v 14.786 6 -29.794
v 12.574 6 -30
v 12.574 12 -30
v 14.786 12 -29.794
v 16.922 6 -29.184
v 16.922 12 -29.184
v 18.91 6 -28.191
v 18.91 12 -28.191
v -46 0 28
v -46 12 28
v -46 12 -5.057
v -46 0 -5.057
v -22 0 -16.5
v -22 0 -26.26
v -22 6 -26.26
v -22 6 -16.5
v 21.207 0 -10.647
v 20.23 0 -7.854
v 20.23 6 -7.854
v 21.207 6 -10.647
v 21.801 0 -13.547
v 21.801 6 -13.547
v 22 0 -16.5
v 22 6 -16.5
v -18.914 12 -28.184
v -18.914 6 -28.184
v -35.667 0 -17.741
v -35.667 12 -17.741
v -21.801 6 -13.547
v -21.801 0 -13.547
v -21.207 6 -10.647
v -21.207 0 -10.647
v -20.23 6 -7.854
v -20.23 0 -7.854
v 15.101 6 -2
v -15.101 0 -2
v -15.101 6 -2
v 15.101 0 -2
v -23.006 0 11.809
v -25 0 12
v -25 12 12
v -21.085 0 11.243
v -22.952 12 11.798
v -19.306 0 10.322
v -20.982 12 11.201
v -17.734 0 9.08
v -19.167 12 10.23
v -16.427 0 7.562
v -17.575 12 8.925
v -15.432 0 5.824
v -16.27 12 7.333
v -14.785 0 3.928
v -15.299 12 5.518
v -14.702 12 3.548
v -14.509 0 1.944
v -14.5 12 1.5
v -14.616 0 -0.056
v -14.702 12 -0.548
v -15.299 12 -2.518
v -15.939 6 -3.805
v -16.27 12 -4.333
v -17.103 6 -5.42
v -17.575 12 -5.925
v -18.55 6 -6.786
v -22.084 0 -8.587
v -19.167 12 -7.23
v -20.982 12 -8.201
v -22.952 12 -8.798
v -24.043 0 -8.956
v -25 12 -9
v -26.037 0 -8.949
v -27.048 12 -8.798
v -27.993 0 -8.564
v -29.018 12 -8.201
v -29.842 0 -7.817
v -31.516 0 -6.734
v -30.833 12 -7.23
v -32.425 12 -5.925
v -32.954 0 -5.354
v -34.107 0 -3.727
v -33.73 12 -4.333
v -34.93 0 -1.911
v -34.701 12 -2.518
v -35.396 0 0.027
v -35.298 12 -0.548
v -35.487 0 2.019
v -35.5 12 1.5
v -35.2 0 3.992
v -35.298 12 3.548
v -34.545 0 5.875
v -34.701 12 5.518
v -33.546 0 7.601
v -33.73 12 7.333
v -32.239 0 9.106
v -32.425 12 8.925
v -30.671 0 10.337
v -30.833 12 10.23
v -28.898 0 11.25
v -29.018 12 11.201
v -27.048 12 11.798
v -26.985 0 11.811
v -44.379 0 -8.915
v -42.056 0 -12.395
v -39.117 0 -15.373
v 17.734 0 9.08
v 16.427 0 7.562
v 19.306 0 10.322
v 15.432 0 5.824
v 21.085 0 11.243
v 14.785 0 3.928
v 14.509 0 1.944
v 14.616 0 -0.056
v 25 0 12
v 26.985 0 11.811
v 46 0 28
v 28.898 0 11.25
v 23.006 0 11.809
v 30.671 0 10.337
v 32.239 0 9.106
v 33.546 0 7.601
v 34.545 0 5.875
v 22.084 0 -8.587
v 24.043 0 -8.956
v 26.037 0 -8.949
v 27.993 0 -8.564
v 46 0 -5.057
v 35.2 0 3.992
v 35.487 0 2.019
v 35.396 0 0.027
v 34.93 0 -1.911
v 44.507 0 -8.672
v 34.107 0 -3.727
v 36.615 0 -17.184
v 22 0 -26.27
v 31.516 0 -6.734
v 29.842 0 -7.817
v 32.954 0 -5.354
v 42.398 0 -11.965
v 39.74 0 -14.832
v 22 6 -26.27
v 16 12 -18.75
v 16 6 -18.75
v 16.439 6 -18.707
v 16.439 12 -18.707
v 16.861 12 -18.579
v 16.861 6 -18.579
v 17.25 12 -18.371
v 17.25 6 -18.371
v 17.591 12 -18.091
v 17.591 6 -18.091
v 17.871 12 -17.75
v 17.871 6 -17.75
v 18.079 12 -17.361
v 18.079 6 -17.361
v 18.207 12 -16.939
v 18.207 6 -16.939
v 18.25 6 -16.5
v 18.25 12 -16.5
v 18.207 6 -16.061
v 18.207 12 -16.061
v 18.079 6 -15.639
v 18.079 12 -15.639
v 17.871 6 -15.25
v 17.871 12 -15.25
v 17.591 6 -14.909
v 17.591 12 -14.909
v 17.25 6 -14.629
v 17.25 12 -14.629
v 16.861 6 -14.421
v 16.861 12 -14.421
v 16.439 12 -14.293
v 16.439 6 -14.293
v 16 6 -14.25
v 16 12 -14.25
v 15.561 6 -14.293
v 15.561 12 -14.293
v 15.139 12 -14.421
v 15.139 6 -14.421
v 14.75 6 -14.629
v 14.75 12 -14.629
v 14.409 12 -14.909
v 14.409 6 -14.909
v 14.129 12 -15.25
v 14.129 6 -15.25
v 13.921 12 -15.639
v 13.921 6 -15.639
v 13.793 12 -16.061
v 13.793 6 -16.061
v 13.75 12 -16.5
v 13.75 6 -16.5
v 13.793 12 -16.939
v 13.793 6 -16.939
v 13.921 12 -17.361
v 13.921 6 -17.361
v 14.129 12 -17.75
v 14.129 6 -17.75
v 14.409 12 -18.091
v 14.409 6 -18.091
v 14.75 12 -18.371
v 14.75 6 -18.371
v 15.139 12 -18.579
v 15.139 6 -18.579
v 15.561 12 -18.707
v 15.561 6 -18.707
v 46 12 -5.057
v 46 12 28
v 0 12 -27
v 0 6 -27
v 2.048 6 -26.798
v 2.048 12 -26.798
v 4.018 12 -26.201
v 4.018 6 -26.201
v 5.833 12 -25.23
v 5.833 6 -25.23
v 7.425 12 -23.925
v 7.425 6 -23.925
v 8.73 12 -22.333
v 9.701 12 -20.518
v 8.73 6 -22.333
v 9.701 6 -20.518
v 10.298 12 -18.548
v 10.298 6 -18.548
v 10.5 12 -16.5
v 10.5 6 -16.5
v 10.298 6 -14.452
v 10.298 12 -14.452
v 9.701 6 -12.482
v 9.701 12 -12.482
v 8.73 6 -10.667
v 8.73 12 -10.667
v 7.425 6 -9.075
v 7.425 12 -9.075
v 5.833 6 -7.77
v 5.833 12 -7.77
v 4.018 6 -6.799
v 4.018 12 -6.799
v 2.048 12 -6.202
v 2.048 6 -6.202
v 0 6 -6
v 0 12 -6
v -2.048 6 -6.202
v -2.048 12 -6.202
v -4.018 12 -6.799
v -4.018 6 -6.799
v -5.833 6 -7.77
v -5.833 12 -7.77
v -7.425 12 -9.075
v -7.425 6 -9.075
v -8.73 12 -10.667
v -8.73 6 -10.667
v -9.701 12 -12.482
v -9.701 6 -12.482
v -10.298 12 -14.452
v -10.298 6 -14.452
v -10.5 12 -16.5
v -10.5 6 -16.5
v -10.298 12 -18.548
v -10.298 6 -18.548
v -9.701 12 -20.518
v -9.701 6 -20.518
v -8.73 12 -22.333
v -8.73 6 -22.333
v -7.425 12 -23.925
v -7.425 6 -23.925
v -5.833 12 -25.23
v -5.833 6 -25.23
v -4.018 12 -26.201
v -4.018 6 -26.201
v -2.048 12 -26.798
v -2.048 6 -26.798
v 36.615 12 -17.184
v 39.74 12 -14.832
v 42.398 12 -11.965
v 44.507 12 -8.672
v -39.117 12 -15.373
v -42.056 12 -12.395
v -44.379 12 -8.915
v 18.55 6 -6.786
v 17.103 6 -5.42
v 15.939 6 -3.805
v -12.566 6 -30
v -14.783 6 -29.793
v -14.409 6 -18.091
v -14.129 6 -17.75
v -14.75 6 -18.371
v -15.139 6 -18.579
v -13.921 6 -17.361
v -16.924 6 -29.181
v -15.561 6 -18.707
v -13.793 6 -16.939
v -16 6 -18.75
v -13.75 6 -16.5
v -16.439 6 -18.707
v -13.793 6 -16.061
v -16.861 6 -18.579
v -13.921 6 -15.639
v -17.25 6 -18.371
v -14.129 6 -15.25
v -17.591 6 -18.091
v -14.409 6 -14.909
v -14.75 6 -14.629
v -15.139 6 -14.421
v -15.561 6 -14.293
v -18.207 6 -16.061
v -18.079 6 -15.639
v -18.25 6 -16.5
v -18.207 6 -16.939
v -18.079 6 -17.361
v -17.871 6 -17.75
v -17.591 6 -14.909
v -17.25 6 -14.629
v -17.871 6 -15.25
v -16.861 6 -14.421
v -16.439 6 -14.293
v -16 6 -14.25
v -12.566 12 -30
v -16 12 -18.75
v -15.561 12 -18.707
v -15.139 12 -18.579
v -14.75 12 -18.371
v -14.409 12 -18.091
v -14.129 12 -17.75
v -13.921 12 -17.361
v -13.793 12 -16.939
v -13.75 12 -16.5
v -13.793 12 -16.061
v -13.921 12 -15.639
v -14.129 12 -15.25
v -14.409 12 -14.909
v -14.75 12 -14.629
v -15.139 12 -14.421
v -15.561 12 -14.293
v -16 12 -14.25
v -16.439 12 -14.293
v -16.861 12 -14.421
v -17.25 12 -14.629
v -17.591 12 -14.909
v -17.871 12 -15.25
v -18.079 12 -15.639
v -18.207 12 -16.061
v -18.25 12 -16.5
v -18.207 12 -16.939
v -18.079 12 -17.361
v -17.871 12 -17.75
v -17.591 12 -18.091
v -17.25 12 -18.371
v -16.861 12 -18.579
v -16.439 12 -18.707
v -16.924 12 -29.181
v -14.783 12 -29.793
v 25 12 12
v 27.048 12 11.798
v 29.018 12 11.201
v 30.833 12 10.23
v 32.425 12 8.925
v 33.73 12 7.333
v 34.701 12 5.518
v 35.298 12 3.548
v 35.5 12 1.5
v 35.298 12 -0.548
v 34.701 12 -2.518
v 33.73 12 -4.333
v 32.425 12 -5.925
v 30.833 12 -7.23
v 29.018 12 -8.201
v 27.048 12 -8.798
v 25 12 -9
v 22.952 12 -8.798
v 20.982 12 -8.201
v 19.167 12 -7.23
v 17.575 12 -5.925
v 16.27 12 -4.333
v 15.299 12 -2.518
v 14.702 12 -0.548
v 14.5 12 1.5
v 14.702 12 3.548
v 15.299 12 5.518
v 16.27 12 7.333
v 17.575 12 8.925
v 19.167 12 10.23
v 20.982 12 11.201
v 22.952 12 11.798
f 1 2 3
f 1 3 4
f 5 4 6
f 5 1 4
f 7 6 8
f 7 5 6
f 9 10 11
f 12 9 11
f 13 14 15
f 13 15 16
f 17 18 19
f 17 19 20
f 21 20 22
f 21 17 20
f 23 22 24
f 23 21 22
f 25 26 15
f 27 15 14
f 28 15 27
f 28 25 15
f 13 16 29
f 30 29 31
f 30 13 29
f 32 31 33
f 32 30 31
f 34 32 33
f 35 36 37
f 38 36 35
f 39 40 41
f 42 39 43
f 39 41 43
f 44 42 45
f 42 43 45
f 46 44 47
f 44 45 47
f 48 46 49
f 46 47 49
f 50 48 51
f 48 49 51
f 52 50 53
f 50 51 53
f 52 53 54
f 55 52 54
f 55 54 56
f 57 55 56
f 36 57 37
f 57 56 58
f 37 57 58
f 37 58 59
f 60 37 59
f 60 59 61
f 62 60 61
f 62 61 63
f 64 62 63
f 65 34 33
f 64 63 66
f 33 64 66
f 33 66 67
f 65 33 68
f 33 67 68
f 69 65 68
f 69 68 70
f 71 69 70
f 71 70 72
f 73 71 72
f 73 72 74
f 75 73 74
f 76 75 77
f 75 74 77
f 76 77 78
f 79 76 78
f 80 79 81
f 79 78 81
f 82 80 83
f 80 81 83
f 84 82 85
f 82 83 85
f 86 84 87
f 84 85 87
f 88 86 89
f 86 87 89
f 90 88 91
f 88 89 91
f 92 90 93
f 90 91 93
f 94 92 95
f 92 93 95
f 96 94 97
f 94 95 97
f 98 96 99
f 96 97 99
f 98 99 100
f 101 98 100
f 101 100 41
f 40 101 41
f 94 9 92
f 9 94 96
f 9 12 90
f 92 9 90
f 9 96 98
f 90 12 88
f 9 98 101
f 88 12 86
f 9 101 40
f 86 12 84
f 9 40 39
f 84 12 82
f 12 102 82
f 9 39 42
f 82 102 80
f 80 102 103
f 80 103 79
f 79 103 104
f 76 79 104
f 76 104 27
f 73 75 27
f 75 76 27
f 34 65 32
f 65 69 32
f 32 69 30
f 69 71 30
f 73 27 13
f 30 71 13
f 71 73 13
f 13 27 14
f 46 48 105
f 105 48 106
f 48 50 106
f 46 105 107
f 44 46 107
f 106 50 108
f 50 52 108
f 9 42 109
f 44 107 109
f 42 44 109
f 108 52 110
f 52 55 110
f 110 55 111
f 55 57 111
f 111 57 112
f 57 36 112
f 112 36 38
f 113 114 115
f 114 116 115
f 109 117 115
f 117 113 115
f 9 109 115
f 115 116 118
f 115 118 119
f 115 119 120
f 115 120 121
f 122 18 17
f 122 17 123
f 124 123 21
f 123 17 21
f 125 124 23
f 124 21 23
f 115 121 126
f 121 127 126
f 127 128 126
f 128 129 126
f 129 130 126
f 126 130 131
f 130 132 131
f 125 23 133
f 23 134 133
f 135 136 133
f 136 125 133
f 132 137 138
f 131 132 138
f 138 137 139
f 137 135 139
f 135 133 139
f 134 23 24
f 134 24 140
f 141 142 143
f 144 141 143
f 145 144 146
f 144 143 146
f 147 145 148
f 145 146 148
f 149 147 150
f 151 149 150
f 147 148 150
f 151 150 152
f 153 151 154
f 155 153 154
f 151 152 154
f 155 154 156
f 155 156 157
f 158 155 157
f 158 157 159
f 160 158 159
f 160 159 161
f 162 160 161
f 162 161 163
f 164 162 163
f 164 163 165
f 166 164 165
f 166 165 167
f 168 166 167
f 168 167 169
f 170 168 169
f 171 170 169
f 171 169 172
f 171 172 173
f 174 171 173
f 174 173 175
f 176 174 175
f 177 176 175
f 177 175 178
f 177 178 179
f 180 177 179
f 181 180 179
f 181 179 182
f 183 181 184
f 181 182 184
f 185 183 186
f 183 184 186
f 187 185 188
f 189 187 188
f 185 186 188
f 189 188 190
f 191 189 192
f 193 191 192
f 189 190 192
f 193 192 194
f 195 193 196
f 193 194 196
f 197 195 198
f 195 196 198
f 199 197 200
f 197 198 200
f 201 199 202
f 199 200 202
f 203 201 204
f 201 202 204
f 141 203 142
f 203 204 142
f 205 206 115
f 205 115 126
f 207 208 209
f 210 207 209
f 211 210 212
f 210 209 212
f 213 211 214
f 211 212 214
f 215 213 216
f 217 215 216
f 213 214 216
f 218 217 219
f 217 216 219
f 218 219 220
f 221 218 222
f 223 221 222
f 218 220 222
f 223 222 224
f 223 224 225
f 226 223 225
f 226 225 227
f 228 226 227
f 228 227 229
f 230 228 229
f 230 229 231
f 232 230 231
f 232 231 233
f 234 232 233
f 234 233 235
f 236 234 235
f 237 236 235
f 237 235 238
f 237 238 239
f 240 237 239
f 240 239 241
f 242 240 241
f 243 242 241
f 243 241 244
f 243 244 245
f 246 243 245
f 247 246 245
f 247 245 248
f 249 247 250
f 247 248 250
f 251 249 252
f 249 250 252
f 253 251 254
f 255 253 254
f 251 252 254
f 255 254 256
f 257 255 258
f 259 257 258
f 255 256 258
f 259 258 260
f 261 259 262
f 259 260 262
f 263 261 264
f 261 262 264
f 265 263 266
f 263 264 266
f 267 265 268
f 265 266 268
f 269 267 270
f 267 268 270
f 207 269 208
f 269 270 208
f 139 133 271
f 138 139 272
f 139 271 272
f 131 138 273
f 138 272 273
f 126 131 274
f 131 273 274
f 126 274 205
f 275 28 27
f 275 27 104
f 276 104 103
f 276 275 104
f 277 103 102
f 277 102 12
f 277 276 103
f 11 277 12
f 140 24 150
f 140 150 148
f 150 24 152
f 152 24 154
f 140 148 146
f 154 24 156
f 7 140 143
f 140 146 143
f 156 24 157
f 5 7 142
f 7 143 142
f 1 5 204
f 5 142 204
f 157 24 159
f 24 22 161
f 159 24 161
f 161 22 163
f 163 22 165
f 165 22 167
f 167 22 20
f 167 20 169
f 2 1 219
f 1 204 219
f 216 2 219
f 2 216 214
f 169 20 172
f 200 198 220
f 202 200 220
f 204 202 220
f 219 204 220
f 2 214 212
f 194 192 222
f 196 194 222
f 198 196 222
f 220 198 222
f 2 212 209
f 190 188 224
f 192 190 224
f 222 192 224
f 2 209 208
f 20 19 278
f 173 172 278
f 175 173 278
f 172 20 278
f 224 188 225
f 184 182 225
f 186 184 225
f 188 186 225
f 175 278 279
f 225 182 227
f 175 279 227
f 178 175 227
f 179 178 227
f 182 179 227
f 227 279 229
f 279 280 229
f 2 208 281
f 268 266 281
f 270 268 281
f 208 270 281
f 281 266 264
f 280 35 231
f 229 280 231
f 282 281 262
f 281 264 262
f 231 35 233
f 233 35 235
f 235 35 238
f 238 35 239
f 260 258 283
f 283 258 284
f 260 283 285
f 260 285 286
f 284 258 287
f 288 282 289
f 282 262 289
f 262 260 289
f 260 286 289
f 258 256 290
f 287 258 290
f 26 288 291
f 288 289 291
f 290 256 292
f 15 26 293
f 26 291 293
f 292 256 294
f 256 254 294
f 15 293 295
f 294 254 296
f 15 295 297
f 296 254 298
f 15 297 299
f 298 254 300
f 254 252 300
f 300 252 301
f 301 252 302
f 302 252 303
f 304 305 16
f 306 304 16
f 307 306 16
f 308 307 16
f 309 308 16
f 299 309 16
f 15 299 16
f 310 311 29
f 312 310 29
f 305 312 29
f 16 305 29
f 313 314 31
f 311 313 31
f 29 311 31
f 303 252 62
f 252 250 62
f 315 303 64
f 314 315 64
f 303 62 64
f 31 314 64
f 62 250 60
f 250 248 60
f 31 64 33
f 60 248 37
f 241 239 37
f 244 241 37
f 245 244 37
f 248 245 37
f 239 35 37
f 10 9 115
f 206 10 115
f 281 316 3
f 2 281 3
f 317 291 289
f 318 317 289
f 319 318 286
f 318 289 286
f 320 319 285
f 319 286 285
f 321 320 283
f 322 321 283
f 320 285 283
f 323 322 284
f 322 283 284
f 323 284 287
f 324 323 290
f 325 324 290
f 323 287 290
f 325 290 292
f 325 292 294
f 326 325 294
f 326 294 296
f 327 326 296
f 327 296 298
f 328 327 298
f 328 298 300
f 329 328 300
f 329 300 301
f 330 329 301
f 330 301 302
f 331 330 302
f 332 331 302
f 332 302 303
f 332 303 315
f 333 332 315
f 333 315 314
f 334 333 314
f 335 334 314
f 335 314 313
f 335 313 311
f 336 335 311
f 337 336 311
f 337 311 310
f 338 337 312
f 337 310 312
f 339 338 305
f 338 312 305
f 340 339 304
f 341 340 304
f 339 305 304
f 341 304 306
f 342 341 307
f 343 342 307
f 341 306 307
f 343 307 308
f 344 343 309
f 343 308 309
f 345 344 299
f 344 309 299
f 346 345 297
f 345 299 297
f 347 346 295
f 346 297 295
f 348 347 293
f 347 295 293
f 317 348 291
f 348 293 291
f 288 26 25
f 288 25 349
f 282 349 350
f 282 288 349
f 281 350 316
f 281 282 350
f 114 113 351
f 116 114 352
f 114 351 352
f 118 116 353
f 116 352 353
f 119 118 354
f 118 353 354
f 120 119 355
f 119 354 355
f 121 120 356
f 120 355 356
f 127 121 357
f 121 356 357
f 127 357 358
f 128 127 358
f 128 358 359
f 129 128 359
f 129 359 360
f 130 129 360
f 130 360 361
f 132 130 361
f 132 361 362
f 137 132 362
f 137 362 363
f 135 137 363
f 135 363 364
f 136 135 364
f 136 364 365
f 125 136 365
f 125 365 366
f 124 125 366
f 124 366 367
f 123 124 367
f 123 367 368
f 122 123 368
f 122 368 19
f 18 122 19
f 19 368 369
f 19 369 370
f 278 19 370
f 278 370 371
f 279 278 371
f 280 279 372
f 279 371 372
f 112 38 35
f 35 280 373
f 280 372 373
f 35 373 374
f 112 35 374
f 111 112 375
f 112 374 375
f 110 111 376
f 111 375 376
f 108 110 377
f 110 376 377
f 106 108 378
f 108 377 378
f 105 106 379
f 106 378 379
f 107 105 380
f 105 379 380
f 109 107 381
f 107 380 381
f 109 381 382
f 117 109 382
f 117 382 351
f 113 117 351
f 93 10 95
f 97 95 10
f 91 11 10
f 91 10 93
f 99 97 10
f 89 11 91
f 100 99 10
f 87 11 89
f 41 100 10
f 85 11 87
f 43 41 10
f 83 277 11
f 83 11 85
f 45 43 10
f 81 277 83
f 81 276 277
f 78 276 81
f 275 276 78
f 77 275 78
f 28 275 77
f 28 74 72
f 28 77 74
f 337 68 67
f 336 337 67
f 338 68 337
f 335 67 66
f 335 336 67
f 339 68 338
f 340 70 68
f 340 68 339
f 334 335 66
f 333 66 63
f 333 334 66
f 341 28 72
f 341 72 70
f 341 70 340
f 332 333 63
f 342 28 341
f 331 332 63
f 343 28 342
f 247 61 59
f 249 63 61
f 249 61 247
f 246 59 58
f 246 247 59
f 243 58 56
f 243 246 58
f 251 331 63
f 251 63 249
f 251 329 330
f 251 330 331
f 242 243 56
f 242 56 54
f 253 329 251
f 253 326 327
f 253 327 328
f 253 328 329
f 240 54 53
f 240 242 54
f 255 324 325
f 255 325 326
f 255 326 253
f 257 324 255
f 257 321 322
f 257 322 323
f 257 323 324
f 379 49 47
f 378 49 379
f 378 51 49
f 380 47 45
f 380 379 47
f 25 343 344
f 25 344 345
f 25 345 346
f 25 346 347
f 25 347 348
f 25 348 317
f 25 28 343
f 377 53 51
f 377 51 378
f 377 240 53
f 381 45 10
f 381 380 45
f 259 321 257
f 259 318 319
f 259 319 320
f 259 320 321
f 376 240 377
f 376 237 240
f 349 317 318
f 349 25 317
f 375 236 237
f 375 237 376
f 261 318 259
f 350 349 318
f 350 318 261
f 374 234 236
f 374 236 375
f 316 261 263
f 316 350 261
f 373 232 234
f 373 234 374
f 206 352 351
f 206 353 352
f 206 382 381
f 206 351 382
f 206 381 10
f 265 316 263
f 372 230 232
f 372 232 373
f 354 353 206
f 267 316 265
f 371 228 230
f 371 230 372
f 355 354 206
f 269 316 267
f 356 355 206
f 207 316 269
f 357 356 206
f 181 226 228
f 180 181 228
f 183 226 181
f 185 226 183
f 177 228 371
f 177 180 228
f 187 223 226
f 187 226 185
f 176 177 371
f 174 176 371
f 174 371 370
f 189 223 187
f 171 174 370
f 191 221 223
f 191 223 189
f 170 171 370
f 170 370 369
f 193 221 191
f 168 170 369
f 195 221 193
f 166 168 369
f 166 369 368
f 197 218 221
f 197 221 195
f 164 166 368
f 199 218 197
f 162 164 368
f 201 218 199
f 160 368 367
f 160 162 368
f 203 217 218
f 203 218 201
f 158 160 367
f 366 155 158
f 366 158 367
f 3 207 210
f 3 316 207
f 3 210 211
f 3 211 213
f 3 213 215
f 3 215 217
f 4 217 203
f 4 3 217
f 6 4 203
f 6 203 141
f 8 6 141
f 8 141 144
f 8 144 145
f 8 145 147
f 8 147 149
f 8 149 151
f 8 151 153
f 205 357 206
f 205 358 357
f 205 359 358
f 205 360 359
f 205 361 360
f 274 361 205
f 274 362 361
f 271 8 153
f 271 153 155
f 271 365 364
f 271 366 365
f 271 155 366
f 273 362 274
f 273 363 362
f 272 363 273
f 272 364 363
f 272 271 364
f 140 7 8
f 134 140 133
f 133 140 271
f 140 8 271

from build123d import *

# Parameters (mm, degrees)
SKETCH1_W           = 92
SKETCH1_H           = 56
BOSS_EXTRUDE1_DEPTH = 12
SKETCH8_W           = 92
SKETCH8_H           = 2
BOSS_EXTRUDE3_DEPTH = 12
CUT_EXTRUDE1_REACH  = 58.214
SKETCH2_R           = 10.5
CUT_EXTRUDE5_REACH  = 58.214
FILLET2_R           = 12
CUT_EXTRUDE6_DEPTH  = 6
CUT_EXTRUDE7_REACH  = 58.214
SKETCH12_R          = 2.25
SKETCH12_R_2        = 10.5


with BuildPart() as part:
    # Sketch1 → Boss-Extrude1 (new body)
    with BuildSketch(Plane(origin=(0, 0, 0), x_dir=(1, 0, 0), z_dir=(0, 1, 0))):
        Rectangle(SKETCH1_W, SKETCH1_H)
    extrude(amount=BOSS_EXTRUDE1_DEPTH)

    # Sketch8 → Boss-Extrude3 (add)
    with BuildSketch(Plane(origin=(0, 12, 0), x_dir=(1, 0, 0), z_dir=(0, 1, 0))):
        with Locations((0, 29)):
            Rectangle(SKETCH8_W, SKETCH8_H)
    extrude(amount=-BOSS_EXTRUDE3_DEPTH)

    # Sketch2 → Cut-Extrude1 (cut, up to next)
    with BuildSketch(Plane(origin=(0, 12, 0), x_dir=(1, 0, 0), z_dir=(0, 1, 0)), mode=Mode.PRIVATE) as cut_extrude1_sk1:
        with Locations(Location((-25, -1.5, 0), (0, 0, 270))):
            Circle(SKETCH2_R)
    cut_extrude1_tool1 = extrude(cut_extrude1_sk1.sketch, amount=-CUT_EXTRUDE1_REACH, mode=Mode.PRIVATE) & part.part
    # Sketch2 → Cut-Extrude1 (cut, up to next)
    with BuildSketch(Plane(origin=(0, 12, 0), x_dir=(1, 0, 0), z_dir=(0, 1, 0)), mode=Mode.PRIVATE) as cut_extrude1_sk2:
        with Locations(Location((25, -1.5, 0), (0, 0, 270))):
            Circle(SKETCH2_R)
    cut_extrude1_tool2 = extrude(cut_extrude1_sk2.sketch, amount=-CUT_EXTRUDE1_REACH, mode=Mode.PRIVATE) & part.part
    add(cut_extrude1_tool1.solids().sort_by_distance((-25, 12, 1.5))[0], mode=Mode.SUBTRACT)
    add(cut_extrude1_tool2.solids().sort_by_distance((25, 12, 1.5))[0], mode=Mode.SUBTRACT)

    # Sketch10 → Cut-Extrude5 (cut, up to next)
    with BuildSketch(Plane(origin=(0, 12, 0), x_dir=(1, 0, 0), z_dir=(0, 1, 0)), mode=Mode.PRIVATE) as cut_extrude5_sk1:
        with BuildLine():
            Line((-46, 5.057438524), (-46, 30))
            Line((-46, 30), (-16, 30))
            Line((-16, 30), (-35.667304108, 17.740806196))
            ThreePointArc((-35.667304108, 17.740806196), (-42.056420822, 12.395269294), (-46, 5.057438524))
        make_face()
    cut_extrude5_tool1 = extrude(cut_extrude5_sk1.sketch, amount=-CUT_EXTRUDE5_REACH, mode=Mode.PRIVATE) & part.part
    # Sketch10 → Cut-Extrude5 (cut, up to next)
    with BuildSketch(Plane(origin=(0, 12, 0), x_dir=(1, 0, 0), z_dir=(0, 1, 0)), mode=Mode.PRIVATE) as cut_extrude5_sk2:
        with BuildLine():
            Line((46, 5.057438524), (46, 30))
            Line((46, 30), (16, 30))
            Line((16, 30), (36.615382461, 17.183760068))
            ThreePointArc((36.615382461, 17.183760068), (42.39835371, 11.964668142), (46, 5.057438524))
        make_face()
    cut_extrude5_tool2 = extrude(cut_extrude5_sk2.sketch, amount=-CUT_EXTRUDE5_REACH, mode=Mode.PRIVATE) & part.part
    add(cut_extrude5_tool1.solids().sort_by_distance((-36.403407, 12, -23.114901))[0], mode=Mode.SUBTRACT)
    add(cut_extrude5_tool2.solids().sort_by_distance((36.411287, 12, -23.11647))[0], mode=Mode.SUBTRACT)

    # Fillet2
    fillet2_edges = [part.edges().sort_by_distance(p)[0] for p in [
        (-16, 6, -30),
        (16, 6, -30),
    ]]
    fillet(fillet2_edges, radius=FILLET2_R)

    # Sketch11 → Cut-Extrude6 (cut)
    with BuildSketch(Plane.XZ):
        with BuildLine():
            Line((22, -16.5), (22, -26.269899929))
            Line((22, -26.269899929), (16.545392108, -31))
            Line((16.545392108, -31), (-16.545392108, -31))
            Line((-16.545392108, -31), (-22, -26.260028196))
            Line((-22, -26.260028196), (-22, -16.5))
            ThreePointArc((-22, -16.5), (-20.591243605, -8.753988974), (-16.545392108, -2))
            Line((-16.545392108, -2), (16.545392108, -2))
            ThreePointArc((16.545392108, -2), (20.591243605, -8.753988974), (22, -16.5))
        make_face()
    extrude(amount=-CUT_EXTRUDE6_DEPTH, mode=Mode.SUBTRACT)

    # Sketch12 → Cut-Extrude7 (cut, up to next)
    with BuildSketch(Plane.XZ, mode=Mode.PRIVATE) as cut_extrude7_sk1:
        with Locations(Location((16, -16.5, 0), (0, 0, 270))):
            Circle(SKETCH12_R)
    cut_extrude7_tool1 = extrude(cut_extrude7_sk1.sketch, amount=-CUT_EXTRUDE7_REACH, mode=Mode.PRIVATE) & part.part
    # Sketch12 → Cut-Extrude7 (cut, up to next)
    with BuildSketch(Plane.XZ, mode=Mode.PRIVATE) as cut_extrude7_sk2:
        with Locations(Location((-16, -16.5, 0), (0, 0, 270))):
            Circle(SKETCH12_R)
    cut_extrude7_tool2 = extrude(cut_extrude7_sk2.sketch, amount=-CUT_EXTRUDE7_REACH, mode=Mode.PRIVATE) & part.part
    # Sketch12 → Cut-Extrude7 (cut, up to next)
    with BuildSketch(Plane.XZ, mode=Mode.PRIVATE) as cut_extrude7_sk3:
        with Locations(Location((0, -16.5, 0), (0, 0, 270))):
            Circle(SKETCH12_R_2)
    cut_extrude7_tool3 = extrude(cut_extrude7_sk3.sketch, amount=-CUT_EXTRUDE7_REACH, mode=Mode.PRIVATE) & part.part
    add(cut_extrude7_tool1.solids().sort_by_distance((16, 0, -16.5))[0], mode=Mode.SUBTRACT)
    add(cut_extrude7_tool2.solids().sort_by_distance((-16, 0, -16.5))[0], mode=Mode.SUBTRACT)
    add(cut_extrude7_tool3.solids().sort_by_distance((0, 0, -16.5))[0], mode=Mode.SUBTRACT)


solid = part.part
